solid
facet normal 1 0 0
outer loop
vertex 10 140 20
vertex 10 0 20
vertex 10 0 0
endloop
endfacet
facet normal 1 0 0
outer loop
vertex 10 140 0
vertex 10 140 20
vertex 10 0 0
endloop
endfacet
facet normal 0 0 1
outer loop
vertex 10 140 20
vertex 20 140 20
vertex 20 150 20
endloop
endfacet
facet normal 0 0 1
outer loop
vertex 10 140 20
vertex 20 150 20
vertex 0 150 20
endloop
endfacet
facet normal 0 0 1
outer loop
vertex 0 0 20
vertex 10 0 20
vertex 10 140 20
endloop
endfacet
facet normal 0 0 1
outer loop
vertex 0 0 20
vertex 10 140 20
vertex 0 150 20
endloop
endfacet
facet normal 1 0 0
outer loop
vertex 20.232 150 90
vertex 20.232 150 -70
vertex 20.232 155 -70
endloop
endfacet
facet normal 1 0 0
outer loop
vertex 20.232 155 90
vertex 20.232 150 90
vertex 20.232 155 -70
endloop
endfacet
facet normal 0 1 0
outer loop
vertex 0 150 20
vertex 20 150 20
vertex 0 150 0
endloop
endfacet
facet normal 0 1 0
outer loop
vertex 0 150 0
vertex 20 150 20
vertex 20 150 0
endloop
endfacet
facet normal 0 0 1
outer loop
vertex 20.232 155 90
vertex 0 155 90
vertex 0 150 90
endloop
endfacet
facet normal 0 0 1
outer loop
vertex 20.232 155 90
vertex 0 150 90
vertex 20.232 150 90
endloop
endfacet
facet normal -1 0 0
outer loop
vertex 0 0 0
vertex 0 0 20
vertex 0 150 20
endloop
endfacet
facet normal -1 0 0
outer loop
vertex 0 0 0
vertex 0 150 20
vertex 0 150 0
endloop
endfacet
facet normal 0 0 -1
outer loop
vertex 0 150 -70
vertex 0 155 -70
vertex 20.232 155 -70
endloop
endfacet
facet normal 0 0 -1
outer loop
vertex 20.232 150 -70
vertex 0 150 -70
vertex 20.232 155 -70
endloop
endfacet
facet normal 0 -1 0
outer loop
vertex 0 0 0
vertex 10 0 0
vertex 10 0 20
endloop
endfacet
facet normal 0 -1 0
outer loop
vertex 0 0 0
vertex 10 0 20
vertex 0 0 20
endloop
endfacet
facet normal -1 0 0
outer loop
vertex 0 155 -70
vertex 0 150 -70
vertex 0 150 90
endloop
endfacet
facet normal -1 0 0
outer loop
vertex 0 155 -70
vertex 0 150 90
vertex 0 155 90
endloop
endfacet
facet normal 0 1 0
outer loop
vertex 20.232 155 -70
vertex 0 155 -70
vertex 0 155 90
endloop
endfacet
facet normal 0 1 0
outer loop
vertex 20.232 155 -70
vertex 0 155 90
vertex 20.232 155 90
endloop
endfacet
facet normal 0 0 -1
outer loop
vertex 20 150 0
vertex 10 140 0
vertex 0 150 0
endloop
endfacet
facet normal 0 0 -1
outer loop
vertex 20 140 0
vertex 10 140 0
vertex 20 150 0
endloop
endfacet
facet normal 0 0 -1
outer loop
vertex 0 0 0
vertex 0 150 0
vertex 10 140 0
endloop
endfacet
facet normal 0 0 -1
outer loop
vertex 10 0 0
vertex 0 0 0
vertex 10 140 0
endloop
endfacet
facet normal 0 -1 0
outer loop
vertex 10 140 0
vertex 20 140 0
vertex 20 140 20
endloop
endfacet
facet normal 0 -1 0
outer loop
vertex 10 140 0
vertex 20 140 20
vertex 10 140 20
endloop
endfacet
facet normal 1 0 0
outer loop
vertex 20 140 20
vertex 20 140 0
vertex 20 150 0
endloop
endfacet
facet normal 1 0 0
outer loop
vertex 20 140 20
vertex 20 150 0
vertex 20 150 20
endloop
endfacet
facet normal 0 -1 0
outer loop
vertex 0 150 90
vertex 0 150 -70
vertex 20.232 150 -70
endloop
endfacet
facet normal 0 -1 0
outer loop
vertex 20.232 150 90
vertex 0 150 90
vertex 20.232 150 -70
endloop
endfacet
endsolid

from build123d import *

# Parameters (mm, degrees)
EXTRUDE_1_DEPTH      = 150
EXTRUDE_2_DEPTH      = 70
EXTRUDE_2_DEPTH_BACK = 90
SKETCH_7_W           = 20.232494165
SKETCH_7_H           = 5
SKETCH_8_W           = 10
SKETCH_8_H           = 20
CUT_EXTRUDE_1_DEPTH  = 140


with BuildPart() as part:
    # Sketch 3D_1 → 凸台-拉伸1 (new body)
    with BuildSketch(Plane(origin=(0, 0, 0), x_dir=(0.7071067811865476, 0, 0.7071067811865476), z_dir=(0, 1, 0))):
        Polygon((0, 0), (14.142135624, 14.142135624), (28.284271247, 0), (14.142135624, -14.142135624), align=None)
    extrude(amount=EXTRUDE_1_DEPTH)

    # 草图8 → 切除-拉伸1 (cut)
    with BuildSketch(Plane(origin=(0, 0, 0), x_dir=(-1, 0, 0), z_dir=(0, -1, 0))):
        with Locations((-15, -10)):
            Rectangle(SKETCH_8_W, SKETCH_8_H)
    extrude(amount=-CUT_EXTRUDE_1_DEPTH, mode=Mode.SUBTRACT)


with BuildPart() as body_2:
    # 草图7 → 凸台-拉伸2 (new, two sides: drawn at the far end of the back side and taken through both)
    with BuildSketch(Plane.XY.offset(20).offset(-EXTRUDE_2_DEPTH_BACK)):
        with Locations((10.116247083, 152.5)):
            Rectangle(SKETCH_7_W, SKETCH_7_H)
    extrude(amount=EXTRUDE_2_DEPTH + EXTRUDE_2_DEPTH_BACK)


solid = Compound([part.part, body_2.part])
